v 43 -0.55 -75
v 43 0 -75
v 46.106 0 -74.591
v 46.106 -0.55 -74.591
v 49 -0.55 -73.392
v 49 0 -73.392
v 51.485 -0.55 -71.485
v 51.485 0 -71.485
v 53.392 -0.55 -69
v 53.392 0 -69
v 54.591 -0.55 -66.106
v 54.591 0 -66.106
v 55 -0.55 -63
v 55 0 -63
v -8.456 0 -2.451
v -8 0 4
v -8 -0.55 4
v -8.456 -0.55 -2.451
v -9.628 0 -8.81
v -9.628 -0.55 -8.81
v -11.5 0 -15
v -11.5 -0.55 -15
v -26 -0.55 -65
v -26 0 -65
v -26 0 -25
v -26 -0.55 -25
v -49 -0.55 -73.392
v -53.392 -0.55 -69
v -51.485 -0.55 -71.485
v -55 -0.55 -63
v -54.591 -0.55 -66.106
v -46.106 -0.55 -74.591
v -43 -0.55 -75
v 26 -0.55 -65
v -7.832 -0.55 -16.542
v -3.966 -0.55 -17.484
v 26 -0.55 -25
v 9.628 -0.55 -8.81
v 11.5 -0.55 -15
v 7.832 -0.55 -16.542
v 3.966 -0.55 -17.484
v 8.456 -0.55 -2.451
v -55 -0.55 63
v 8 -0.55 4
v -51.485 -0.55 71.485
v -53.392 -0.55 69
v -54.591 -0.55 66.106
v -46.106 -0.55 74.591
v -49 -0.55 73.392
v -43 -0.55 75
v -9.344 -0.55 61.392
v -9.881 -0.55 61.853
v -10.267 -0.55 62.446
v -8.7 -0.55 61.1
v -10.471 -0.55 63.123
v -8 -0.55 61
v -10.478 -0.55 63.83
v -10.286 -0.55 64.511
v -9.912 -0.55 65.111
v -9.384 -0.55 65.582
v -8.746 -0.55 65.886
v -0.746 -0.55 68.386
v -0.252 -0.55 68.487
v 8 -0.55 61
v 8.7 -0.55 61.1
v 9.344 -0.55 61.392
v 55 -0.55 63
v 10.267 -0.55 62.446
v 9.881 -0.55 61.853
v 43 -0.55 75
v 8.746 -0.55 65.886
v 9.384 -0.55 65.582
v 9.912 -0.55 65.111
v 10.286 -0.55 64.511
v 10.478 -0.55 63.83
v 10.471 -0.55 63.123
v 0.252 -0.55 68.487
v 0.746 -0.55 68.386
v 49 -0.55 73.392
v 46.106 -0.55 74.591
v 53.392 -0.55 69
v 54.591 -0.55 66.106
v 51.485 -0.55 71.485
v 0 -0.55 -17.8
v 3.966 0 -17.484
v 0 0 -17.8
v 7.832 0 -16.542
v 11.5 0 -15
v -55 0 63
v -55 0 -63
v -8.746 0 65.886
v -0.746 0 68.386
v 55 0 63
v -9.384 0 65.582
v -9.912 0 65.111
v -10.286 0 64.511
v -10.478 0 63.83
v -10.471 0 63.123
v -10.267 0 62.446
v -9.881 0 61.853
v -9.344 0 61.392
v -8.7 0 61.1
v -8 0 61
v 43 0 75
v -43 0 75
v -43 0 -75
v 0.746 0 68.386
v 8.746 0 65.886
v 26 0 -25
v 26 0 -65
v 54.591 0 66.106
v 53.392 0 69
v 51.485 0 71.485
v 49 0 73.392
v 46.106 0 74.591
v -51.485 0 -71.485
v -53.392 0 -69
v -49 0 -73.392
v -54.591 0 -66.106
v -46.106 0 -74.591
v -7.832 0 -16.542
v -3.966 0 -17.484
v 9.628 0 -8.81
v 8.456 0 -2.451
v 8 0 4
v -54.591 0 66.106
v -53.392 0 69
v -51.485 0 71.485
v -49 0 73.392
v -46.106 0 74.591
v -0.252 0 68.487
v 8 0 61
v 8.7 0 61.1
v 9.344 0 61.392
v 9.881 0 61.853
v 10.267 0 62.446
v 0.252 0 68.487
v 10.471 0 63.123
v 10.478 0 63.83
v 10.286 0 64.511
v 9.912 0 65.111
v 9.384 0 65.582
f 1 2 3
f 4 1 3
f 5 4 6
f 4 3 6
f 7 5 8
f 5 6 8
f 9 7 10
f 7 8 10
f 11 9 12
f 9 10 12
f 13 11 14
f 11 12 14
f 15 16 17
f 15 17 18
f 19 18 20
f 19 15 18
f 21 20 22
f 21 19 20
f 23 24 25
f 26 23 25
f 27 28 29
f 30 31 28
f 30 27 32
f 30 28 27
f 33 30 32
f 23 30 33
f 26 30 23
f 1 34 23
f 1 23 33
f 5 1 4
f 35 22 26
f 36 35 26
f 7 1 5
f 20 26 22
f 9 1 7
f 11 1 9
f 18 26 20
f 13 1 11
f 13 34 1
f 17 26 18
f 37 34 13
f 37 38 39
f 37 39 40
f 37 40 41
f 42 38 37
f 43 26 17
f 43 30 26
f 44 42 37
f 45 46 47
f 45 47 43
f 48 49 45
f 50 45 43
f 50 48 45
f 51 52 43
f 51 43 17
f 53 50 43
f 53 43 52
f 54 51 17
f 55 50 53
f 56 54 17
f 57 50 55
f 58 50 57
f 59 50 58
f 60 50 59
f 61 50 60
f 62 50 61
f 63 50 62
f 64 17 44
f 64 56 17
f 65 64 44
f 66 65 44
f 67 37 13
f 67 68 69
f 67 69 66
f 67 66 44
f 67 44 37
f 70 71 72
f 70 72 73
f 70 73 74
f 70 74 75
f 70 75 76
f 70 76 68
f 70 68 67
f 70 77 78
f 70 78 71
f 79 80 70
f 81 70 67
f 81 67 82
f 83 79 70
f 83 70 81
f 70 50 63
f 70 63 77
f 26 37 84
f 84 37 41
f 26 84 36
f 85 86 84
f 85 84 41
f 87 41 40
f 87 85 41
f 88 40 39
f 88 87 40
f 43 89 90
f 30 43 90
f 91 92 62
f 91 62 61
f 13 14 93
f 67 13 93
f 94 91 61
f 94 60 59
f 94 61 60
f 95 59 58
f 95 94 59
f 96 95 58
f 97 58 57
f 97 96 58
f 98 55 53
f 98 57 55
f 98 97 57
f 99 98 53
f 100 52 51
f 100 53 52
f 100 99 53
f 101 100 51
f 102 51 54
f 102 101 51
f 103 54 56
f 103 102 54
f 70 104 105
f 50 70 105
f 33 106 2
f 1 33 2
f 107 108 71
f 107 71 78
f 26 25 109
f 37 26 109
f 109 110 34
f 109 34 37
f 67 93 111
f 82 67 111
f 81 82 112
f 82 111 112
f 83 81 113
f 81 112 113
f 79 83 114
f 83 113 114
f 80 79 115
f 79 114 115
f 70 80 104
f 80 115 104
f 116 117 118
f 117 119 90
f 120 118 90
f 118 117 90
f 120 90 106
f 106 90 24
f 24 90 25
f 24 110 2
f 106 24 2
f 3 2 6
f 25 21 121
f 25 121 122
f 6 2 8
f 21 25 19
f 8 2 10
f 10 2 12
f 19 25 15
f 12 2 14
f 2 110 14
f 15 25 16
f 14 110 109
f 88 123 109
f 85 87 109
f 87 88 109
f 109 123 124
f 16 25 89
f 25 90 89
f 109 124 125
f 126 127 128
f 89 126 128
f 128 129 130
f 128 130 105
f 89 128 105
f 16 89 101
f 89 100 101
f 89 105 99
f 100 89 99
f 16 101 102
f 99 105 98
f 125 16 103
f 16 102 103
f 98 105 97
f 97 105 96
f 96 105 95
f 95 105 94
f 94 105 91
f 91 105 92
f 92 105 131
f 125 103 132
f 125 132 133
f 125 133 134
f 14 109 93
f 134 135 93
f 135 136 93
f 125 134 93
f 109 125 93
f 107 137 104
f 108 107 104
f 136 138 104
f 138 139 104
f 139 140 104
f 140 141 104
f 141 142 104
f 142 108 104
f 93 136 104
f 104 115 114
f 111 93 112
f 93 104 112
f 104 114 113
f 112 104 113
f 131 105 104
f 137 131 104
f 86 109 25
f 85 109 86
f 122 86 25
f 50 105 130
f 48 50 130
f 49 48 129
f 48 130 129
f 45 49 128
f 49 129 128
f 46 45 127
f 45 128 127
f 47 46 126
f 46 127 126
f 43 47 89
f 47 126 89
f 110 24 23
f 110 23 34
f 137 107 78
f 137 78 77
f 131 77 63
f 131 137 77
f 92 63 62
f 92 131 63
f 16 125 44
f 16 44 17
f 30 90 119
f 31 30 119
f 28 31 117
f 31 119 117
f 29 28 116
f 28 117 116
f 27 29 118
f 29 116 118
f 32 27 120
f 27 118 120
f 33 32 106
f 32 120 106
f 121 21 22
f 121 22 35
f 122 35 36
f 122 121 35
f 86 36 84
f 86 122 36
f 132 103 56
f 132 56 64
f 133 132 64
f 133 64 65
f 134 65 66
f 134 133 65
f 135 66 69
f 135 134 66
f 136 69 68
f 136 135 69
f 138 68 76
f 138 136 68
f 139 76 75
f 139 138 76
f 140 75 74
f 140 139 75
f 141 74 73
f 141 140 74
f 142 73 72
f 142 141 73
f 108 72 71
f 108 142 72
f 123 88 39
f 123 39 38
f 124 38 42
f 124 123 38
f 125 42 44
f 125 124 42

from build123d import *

# Parameters (mm, degrees)
F1_DEPTH = 0.55
F2_W     = 52
F2_H     = 40
F3_DEPTH = 0.551
F5_DEPTH = 0.551


with BuildPart() as f1:
    # F0 (on Front) → F1 (new body)
    with BuildSketch(Plane.XZ):
        with BuildLine():
            ThreePointArc((55, 63), (51.485281, 71.485281), (43, 75))
            Line((43, 75), (-43, 75))
            ThreePointArc((-43, 75), (-51.485281, 71.485281), (-55, 63))
            Line((-55, 63), (-55, -63))
            ThreePointArc((-55, -63), (-51.485281, -71.485281), (-43, -75))
            Line((-43, -75), (43, -75))
            ThreePointArc((43, -75), (51.485281, -71.485281), (55, -63))
            Line((55, -63), (55, 63))
        make_face()
    extrude(amount=F1_DEPTH)

    # F2 (on Front) → F3 (cut, through all)
    with BuildSketch(Plane.XZ):
        with BuildLine():
            Line((0, 4), (-8, 4))
            ThreePointArc((-8, 4), (-8.953329, -5.646755), (-11.5, -15))
            ThreePointArc((-11.5, -15), (-5.917981, -17.089922), (0, -17.8))
            ThreePointArc((0, -17.8), (5.917981, -17.089922), (11.5, -15))
            ThreePointArc((11.5, -15), (8.953329, -5.646755), (8, 4))
            Line((8, 4), (0, 4))
        make_face()
        with Locations((0, -45)):
            Rectangle(F2_W, F2_H)
    extrude(amount=F3_DEPTH, mode=Mode.SUBTRACT)

    # F4 (on Front) → F5 (cut, through all)
    with BuildSketch(Plane.XZ):
        with BuildLine():
            Line((-8, 61), (8, 61))
            ThreePointArc((8, 61), (10.471386, 63.122839), (8.745688, 65.8862))
            Line((8.745688, 65.8862), (0.745688, 68.3862))
            ThreePointArc((0.745688, 68.3862), (0, 68.5), (-0.745687, 68.3862))
            Line((-0.745687, 68.3862), (-8.745687, 65.8862))
            ThreePointArc((-8.745687, 65.8862), (-10.471386, 63.122839), (-8, 61))
        make_face()
    extrude(amount=F5_DEPTH, mode=Mode.SUBTRACT)


solid = f1.part
